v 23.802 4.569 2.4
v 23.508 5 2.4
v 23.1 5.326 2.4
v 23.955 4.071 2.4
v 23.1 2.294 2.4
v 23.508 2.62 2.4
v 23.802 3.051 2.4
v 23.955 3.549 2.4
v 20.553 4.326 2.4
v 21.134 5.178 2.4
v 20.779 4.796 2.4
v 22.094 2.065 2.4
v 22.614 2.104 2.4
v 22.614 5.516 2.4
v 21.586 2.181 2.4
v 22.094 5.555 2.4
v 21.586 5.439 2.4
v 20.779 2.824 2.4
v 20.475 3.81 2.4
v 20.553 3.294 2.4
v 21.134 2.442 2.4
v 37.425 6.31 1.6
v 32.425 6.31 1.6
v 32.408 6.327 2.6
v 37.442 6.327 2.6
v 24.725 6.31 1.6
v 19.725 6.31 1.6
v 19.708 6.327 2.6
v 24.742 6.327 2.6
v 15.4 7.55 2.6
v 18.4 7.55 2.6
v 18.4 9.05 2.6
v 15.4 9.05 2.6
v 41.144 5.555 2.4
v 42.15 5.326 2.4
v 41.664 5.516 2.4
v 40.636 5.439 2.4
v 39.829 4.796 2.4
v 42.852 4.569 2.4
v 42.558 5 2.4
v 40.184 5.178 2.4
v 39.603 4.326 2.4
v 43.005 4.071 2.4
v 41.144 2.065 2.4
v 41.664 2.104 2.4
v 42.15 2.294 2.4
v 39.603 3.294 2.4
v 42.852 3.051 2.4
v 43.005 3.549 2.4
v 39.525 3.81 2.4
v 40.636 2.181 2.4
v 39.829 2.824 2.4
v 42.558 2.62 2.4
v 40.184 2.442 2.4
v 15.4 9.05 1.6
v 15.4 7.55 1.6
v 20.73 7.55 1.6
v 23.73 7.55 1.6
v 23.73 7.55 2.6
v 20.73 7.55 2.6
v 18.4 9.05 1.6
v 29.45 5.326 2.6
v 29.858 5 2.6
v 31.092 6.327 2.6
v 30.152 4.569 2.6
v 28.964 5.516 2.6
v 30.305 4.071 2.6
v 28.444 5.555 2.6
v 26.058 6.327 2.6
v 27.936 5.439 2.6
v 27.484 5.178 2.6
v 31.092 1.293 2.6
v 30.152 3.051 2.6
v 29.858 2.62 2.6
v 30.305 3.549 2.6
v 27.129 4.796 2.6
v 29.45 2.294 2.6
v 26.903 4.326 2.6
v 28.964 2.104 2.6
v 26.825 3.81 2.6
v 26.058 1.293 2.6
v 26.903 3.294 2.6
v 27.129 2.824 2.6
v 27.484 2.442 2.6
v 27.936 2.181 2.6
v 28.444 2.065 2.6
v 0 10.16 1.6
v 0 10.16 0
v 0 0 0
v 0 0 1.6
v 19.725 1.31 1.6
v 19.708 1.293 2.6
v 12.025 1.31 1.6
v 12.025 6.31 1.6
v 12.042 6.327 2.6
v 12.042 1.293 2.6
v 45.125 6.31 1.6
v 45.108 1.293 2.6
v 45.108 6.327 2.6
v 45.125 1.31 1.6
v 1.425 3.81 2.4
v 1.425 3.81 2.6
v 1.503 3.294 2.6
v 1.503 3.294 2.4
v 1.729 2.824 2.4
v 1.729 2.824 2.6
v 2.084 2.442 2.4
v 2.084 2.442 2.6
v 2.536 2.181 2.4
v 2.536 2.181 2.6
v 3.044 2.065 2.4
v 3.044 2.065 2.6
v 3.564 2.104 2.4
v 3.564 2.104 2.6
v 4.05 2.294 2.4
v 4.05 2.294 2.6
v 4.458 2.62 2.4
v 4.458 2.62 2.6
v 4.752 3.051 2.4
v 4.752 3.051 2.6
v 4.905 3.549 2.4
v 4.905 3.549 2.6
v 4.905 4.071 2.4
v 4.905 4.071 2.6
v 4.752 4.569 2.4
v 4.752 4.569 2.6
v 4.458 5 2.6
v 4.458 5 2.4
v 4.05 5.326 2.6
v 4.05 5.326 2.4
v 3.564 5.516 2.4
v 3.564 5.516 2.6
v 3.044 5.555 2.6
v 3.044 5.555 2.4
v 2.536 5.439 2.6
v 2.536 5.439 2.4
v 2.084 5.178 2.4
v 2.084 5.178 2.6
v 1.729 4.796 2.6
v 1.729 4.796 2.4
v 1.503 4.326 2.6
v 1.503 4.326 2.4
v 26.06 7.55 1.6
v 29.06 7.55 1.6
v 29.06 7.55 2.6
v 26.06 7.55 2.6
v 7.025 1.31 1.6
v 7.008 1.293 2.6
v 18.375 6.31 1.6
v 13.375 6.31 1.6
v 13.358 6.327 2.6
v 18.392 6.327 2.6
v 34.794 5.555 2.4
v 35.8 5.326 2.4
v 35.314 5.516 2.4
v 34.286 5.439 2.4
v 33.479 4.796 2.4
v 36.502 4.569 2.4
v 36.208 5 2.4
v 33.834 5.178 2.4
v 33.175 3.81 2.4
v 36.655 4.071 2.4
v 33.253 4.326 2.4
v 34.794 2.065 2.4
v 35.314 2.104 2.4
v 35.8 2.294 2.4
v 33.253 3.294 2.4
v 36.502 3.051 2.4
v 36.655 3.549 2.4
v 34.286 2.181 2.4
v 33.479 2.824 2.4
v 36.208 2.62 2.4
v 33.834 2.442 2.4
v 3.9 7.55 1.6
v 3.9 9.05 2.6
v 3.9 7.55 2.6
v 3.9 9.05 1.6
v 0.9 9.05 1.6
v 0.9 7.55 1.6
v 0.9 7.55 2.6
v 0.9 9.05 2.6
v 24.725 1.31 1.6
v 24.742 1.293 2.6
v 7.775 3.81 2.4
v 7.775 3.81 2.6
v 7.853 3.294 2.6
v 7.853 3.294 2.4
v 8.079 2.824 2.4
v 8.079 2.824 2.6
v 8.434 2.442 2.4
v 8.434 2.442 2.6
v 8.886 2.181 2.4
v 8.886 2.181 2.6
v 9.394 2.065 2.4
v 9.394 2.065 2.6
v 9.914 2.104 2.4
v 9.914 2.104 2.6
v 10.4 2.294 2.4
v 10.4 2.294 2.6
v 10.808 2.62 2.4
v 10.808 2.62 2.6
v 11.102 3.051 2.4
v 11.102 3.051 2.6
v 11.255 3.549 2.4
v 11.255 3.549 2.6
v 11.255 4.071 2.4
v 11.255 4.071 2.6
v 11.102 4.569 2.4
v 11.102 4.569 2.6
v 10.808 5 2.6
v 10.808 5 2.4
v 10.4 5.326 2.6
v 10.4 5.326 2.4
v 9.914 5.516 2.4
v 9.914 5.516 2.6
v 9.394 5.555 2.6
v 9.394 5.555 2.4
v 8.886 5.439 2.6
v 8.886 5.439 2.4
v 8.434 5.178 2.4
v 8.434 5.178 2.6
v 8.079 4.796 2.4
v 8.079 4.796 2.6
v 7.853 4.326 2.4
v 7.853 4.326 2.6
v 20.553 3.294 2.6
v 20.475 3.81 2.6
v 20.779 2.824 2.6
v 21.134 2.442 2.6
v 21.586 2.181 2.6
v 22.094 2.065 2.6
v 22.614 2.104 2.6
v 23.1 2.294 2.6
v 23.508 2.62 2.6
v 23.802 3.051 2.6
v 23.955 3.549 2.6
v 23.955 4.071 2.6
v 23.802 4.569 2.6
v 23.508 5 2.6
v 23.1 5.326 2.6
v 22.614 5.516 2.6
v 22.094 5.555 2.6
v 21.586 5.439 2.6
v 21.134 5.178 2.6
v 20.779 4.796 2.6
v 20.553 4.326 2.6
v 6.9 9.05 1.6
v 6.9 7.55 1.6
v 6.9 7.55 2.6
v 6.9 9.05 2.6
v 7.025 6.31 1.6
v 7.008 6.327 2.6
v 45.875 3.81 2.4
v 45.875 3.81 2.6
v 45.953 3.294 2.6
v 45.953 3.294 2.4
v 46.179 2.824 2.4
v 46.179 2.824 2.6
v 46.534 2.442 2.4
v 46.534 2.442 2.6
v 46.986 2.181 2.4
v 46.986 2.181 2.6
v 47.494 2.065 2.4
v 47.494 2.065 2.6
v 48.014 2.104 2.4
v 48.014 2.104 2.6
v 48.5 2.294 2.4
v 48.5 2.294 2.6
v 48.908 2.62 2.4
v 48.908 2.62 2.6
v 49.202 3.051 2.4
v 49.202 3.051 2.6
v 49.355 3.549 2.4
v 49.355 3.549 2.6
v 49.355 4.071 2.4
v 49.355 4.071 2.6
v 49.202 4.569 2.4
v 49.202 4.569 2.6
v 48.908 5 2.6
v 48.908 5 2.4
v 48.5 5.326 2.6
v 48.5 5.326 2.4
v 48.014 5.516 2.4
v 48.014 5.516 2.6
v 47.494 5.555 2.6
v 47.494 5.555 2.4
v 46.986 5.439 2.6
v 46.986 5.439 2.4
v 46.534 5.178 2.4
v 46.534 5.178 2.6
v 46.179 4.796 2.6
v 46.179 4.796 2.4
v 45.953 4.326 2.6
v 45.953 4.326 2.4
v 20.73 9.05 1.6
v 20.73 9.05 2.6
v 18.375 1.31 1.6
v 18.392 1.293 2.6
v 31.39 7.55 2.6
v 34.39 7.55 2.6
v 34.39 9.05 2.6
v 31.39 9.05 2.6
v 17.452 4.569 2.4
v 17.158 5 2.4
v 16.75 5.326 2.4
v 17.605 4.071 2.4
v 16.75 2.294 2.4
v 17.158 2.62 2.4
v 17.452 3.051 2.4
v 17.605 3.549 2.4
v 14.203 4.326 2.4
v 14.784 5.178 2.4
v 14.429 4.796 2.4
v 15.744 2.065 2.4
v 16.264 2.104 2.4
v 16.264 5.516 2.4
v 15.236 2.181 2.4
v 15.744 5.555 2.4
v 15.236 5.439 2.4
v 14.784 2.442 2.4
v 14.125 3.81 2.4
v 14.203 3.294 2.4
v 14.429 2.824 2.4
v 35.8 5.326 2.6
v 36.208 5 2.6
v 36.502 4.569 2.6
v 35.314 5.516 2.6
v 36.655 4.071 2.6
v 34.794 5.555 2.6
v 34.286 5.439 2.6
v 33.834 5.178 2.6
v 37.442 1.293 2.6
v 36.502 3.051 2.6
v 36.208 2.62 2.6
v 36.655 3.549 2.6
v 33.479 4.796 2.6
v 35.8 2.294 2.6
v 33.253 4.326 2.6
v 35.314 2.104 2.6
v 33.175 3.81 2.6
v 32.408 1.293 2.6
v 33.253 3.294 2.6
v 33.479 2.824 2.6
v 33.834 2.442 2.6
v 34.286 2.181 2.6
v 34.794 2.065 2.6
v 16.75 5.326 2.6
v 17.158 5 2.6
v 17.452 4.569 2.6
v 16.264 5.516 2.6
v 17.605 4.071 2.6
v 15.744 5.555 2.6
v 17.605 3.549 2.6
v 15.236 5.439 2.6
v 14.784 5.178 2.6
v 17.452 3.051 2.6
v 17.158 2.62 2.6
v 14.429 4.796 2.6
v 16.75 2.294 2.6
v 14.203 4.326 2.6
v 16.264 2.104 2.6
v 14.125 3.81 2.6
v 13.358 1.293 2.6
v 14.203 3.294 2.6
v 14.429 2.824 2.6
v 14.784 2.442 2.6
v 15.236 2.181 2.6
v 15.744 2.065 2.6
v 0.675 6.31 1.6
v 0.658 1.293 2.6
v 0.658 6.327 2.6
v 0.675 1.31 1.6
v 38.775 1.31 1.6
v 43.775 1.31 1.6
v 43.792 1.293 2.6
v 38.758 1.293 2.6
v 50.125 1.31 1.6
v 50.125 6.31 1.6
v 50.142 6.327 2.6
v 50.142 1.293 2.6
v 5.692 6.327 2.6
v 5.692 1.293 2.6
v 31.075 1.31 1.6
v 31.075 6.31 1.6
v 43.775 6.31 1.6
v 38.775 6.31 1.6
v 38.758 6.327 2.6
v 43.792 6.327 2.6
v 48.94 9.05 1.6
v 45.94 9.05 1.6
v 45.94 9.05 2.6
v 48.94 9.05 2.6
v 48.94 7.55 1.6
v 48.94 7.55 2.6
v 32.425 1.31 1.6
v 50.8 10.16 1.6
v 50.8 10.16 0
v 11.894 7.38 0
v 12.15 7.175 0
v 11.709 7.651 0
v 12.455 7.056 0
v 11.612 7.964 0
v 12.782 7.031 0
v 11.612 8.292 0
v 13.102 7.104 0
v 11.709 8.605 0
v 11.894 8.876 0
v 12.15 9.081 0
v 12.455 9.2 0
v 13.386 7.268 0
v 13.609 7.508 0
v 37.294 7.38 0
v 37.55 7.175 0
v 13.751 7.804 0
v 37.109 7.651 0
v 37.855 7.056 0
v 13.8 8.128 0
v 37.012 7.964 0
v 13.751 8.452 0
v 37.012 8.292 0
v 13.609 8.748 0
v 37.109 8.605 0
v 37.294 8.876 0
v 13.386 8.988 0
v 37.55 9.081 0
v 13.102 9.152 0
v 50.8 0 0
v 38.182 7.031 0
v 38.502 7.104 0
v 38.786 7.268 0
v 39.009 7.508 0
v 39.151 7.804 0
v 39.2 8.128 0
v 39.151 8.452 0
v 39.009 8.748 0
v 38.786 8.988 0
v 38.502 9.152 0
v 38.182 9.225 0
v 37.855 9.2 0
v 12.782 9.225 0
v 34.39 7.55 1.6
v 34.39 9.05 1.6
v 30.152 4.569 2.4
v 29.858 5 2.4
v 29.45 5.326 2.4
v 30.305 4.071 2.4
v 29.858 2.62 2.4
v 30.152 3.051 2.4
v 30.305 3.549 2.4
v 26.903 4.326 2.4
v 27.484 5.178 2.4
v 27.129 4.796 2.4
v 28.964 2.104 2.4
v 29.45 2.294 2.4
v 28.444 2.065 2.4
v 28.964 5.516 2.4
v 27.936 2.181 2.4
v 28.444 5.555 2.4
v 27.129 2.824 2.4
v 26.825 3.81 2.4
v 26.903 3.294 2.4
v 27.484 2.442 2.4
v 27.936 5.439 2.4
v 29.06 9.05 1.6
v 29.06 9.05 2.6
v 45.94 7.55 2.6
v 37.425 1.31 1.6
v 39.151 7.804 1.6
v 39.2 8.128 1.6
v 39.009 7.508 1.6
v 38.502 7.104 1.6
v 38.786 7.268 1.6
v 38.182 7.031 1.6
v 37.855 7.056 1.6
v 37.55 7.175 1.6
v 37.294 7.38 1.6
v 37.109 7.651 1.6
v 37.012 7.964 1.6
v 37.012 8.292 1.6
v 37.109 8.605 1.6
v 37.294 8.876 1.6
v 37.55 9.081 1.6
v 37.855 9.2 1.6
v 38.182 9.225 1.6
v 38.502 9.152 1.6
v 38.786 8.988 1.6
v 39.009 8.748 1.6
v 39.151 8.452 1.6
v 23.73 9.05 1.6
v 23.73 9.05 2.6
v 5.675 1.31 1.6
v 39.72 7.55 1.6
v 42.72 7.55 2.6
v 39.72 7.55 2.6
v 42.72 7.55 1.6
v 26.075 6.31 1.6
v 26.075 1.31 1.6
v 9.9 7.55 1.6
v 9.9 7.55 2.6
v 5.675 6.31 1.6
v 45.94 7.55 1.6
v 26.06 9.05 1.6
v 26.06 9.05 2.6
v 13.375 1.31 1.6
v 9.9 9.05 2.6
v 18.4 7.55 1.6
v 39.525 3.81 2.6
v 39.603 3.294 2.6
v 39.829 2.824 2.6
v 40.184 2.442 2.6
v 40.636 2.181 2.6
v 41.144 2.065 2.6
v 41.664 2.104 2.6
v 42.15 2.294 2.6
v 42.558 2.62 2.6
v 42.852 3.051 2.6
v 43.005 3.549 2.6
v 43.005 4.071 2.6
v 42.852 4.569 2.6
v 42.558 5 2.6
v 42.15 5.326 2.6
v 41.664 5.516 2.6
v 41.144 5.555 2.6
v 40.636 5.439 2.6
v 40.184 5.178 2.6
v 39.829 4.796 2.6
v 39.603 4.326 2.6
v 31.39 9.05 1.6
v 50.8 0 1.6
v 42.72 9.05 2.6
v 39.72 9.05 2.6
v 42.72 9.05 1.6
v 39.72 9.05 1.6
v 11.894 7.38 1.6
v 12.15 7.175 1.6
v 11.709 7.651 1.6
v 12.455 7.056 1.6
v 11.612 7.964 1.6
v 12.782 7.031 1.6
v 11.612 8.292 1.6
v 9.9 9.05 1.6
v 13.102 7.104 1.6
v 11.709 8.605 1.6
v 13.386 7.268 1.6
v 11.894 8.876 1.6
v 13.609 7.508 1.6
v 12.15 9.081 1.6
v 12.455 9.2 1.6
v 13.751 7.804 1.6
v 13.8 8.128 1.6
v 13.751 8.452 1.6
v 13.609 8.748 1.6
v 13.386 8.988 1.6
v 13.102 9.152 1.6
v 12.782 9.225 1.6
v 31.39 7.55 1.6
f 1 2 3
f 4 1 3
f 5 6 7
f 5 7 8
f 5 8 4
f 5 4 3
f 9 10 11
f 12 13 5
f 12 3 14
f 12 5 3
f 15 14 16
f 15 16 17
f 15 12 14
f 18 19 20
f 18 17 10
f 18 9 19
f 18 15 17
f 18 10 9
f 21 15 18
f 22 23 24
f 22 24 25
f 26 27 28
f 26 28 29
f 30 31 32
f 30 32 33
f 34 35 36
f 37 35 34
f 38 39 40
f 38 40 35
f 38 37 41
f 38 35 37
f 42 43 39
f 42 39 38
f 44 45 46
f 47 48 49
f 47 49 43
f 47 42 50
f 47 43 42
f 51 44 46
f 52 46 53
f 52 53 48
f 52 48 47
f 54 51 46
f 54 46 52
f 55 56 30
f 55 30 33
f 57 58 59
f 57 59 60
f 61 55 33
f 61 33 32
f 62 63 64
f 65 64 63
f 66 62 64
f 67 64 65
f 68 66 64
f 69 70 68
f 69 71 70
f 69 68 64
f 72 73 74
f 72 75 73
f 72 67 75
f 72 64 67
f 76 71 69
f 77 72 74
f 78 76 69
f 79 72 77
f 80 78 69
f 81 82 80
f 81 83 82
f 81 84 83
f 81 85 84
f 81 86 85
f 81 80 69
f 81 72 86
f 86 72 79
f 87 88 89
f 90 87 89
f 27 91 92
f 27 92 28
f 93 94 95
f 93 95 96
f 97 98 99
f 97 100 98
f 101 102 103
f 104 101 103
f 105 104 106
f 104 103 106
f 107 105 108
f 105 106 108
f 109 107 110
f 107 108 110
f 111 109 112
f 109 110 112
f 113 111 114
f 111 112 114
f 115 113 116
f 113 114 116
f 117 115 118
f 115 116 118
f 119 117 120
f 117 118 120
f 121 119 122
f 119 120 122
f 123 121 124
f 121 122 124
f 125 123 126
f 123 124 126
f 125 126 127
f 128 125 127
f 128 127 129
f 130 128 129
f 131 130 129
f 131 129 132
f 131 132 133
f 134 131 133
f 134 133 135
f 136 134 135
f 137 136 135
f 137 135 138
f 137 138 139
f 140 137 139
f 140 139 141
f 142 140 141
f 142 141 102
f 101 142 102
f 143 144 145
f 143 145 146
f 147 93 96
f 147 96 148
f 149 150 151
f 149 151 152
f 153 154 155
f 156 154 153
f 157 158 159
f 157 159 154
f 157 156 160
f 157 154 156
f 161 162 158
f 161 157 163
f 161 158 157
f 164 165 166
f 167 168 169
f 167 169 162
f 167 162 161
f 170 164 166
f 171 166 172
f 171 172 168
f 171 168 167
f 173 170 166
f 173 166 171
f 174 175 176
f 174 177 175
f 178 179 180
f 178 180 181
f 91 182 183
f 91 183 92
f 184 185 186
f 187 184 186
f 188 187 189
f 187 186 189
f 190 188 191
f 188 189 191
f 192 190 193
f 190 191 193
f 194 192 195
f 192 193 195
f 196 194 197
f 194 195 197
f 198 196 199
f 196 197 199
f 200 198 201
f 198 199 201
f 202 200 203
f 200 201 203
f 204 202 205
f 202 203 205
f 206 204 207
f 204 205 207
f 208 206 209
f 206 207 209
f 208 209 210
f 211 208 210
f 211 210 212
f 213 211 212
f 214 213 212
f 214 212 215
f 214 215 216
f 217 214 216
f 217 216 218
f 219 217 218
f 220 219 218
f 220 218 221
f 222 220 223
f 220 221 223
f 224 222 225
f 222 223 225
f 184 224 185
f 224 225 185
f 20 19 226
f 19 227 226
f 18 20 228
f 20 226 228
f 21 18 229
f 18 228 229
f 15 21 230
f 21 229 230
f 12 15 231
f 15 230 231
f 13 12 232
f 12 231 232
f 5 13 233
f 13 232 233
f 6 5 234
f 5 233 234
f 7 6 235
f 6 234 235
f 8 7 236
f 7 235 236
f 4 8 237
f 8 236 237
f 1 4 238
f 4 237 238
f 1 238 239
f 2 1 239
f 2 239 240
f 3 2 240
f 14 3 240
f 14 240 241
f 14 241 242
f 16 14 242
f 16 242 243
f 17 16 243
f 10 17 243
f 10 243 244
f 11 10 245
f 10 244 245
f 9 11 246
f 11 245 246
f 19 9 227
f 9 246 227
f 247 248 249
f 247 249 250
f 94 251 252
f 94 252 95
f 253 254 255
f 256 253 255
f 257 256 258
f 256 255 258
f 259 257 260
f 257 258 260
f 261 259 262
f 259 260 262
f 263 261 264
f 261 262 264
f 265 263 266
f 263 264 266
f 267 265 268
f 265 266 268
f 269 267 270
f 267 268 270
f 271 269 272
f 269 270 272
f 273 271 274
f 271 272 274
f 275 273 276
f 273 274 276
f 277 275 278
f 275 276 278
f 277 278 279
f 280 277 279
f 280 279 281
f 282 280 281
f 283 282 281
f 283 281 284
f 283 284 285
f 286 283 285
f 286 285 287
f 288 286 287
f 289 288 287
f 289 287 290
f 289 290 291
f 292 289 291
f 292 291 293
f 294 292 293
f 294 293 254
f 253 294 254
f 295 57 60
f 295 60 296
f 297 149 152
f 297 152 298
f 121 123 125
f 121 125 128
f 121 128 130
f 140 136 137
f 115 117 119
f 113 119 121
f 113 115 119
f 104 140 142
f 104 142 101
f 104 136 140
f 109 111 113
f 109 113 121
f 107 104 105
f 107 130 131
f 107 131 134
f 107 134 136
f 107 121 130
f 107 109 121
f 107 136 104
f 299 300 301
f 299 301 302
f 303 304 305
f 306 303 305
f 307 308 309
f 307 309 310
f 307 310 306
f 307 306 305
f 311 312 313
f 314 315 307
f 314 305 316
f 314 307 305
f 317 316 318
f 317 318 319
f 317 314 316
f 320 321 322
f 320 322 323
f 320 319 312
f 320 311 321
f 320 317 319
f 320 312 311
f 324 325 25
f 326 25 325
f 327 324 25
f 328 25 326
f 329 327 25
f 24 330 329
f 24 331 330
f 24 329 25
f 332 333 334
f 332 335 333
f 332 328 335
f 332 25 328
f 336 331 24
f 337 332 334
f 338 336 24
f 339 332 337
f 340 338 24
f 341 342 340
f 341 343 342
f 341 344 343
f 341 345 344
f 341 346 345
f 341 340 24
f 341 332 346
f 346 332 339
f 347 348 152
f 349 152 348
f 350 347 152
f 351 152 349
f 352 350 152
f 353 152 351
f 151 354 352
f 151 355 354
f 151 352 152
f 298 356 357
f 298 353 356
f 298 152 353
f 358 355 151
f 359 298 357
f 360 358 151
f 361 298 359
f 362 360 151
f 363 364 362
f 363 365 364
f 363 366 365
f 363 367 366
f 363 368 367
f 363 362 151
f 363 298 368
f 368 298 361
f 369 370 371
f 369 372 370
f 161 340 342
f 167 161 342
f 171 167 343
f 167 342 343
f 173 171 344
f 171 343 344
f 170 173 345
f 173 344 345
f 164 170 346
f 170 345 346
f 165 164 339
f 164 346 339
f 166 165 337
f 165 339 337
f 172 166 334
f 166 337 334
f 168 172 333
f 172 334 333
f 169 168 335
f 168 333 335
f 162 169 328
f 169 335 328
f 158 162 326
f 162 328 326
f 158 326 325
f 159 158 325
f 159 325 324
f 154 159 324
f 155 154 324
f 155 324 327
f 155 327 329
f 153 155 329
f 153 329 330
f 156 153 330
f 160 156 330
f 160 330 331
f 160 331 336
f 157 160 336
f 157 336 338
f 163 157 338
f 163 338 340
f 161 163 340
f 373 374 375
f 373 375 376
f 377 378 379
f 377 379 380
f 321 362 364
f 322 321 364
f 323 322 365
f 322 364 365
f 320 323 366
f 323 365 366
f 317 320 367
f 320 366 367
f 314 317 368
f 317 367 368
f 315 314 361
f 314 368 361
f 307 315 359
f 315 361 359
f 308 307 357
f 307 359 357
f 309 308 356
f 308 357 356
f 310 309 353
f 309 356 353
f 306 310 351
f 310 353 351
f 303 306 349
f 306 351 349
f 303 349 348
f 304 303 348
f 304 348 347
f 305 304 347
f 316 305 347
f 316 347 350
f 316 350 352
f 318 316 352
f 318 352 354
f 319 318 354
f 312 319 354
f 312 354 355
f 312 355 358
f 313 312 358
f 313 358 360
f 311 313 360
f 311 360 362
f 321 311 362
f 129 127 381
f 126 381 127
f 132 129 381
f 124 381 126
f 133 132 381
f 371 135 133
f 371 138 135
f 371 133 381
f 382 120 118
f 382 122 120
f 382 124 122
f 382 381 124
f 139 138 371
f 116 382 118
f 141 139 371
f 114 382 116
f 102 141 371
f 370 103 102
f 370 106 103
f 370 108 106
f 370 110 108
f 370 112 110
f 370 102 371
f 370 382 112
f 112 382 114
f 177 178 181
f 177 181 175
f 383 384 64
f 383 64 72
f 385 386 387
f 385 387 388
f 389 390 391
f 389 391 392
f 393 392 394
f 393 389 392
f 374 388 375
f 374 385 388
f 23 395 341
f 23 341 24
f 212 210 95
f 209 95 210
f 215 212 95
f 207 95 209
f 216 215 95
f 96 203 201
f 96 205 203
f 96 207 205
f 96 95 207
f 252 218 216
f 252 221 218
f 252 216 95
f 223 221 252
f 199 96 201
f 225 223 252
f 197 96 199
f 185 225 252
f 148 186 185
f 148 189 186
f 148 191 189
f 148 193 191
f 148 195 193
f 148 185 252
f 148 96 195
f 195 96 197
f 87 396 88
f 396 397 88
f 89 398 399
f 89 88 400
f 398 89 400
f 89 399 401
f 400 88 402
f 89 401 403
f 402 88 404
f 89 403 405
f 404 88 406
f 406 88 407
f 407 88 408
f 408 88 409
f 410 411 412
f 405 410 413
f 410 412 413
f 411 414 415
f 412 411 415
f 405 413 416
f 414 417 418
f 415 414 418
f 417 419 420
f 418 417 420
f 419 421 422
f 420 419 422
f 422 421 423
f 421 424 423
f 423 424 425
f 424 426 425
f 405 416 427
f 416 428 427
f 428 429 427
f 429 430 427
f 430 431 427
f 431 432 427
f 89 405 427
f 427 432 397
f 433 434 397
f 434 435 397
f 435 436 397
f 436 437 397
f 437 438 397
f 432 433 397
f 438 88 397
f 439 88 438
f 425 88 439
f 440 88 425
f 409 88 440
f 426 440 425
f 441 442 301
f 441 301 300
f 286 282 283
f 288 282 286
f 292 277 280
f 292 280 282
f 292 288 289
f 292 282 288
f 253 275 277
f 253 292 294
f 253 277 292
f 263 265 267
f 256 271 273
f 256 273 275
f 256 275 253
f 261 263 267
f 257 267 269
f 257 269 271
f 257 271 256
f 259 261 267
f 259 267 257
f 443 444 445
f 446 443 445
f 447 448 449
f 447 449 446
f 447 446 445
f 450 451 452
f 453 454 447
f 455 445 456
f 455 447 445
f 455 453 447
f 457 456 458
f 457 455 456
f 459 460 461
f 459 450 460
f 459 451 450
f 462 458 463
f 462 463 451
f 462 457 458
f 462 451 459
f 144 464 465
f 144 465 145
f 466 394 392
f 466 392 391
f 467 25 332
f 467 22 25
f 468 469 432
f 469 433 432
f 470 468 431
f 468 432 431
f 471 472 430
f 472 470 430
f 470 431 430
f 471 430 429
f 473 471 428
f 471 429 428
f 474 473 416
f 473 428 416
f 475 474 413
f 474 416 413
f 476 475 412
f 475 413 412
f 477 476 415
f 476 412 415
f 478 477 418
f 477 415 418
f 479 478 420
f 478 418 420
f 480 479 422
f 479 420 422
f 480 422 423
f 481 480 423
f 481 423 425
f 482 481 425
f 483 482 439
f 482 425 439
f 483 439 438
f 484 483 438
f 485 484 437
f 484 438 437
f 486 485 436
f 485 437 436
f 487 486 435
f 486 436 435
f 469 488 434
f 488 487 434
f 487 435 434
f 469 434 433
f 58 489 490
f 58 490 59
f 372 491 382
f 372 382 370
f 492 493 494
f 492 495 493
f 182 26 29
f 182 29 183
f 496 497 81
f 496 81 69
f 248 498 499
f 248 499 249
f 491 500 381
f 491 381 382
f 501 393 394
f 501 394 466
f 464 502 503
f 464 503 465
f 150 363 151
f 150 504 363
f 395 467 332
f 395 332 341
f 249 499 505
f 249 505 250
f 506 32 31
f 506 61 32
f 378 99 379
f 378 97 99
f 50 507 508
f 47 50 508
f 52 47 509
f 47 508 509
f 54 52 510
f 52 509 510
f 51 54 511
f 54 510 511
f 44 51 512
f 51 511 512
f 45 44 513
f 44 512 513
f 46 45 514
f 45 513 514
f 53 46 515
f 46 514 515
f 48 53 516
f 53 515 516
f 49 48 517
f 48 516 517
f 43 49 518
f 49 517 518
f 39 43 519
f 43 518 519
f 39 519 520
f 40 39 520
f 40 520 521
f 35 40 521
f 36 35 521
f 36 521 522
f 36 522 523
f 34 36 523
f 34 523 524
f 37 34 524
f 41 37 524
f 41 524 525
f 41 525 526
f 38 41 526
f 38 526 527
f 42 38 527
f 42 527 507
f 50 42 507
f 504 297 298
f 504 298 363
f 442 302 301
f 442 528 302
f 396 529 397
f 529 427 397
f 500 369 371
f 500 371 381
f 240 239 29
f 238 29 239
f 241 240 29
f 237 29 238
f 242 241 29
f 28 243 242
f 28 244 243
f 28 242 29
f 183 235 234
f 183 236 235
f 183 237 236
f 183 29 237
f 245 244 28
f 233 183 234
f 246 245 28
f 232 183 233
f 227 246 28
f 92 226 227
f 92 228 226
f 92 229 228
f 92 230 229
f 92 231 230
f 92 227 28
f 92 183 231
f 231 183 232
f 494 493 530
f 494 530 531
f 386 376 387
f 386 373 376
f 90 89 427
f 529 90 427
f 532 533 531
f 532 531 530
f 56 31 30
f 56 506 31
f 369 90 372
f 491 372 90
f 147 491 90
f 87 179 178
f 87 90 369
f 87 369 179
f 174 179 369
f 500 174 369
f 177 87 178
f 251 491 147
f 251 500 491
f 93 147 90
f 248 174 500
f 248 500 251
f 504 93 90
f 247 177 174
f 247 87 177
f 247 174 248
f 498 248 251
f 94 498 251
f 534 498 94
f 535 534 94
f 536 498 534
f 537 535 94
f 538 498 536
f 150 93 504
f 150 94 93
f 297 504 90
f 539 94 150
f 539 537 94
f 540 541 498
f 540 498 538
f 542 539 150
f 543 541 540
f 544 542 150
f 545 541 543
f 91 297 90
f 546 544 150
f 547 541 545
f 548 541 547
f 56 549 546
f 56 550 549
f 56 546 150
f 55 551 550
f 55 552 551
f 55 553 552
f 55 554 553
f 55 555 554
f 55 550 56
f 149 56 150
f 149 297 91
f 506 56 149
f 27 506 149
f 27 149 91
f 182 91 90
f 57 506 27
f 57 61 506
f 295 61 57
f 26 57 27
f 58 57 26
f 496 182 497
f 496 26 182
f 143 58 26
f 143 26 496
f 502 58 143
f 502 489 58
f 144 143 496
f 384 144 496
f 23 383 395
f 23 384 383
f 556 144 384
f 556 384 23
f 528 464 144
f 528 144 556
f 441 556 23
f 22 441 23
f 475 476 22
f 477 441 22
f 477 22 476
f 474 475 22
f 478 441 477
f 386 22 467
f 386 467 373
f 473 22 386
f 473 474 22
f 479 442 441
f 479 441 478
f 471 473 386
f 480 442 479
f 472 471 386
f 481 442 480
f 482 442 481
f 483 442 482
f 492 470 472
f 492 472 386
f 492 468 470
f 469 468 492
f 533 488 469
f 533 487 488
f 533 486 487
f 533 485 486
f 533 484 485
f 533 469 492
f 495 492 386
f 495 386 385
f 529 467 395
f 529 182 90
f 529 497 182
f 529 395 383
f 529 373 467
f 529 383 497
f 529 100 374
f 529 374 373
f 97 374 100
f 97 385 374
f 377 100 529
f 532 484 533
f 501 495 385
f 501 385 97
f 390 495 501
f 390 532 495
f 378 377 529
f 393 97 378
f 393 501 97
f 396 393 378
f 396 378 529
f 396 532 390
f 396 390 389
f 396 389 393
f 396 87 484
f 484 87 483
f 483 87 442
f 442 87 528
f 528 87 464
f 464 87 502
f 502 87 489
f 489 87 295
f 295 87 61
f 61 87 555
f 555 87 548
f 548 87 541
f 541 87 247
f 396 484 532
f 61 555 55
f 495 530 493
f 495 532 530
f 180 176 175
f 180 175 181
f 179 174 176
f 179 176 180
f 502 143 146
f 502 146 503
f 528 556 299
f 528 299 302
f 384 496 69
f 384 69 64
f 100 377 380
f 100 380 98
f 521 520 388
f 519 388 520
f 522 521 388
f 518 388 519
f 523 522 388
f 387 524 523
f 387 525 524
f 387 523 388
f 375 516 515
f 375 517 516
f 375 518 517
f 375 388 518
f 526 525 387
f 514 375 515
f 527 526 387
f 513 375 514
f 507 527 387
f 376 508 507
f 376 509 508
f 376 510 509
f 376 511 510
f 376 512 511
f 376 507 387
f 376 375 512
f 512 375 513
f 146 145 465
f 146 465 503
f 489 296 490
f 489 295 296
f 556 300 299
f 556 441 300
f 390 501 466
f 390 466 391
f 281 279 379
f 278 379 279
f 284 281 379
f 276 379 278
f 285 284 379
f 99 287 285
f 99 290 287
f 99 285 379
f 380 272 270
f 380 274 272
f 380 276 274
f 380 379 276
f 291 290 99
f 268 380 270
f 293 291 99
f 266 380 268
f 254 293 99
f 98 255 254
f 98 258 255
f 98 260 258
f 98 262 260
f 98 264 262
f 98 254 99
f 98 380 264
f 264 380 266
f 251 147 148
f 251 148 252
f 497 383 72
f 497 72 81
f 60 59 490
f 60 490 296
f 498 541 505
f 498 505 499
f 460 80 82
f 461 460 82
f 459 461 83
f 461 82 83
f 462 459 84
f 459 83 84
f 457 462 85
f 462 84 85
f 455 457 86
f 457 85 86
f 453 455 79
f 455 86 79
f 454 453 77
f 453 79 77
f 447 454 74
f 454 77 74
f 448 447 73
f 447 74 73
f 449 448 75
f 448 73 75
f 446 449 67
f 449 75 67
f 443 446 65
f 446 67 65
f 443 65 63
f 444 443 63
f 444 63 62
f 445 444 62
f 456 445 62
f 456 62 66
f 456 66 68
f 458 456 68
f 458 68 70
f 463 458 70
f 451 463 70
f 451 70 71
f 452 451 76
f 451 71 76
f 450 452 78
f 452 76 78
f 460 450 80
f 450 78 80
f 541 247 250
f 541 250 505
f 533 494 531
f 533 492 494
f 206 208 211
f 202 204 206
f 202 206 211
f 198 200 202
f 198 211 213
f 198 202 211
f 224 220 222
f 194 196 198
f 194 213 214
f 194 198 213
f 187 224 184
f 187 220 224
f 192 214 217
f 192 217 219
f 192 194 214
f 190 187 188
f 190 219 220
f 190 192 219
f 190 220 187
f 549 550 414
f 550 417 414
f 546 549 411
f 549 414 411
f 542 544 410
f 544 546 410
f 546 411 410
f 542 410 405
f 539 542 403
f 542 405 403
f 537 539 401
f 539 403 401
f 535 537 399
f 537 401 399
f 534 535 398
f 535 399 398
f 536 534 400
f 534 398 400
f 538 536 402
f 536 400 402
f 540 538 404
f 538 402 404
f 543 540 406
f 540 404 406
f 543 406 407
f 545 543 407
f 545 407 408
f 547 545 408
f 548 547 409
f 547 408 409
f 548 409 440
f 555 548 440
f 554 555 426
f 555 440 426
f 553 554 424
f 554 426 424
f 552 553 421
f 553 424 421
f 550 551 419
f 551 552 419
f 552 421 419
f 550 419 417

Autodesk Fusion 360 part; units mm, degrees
sketch "Sketch1" plane through (0, 0, 0) normal (0, 0, 1) x (1, 0, 0)
  line L0 (0, 0) -> (50.8, 0)
  line L1 (50.8, 0) -> (50.8, 10.16)
  line L2 (50.8, 10.16) -> (0, 10.16)
  line L3 (0, 10.16) -> (0, 0)
  line L4 (25.4, 10.16) -> (25.4, 0) construction
  circle A0 centre (12.7, 8.128) radius 1.1
  circle A1 centre (38.1, 8.128) radius 1.1
  dimension "d1" = 50.8
  dimension "d2" = 10.16
  dimension "d3" = 2.2
  dimension "d4" = 2.2
  dimension "d5" = 12.7
  dimension "d6" = 38.1
  dimension "d7" = 8.128
  dimension "d8" = 8.128
extrude "Extrude1" add sketch "Sketch1" along normal blind 1.6
sketch "Sketch2" plane through (0, 0, 1.6) normal (0, 0, 1) x (-1, 0, 0)
  circle A0 centre (-12.7, -8.128) radius 1.1
  circle A1 centre (-38.1, -8.128) radius 1.1
  line L0 (0, -10.16) -> (0, 0)
  line L1 (0, 0) -> (-50.8, 0)
  line L2 (-50.8, 0) -> (-50.8, -10.16)
  line L3 (-50.8, -10.16) -> (0, -10.16)
  line L4 (-5.675, -1.31) -> (-0.675, -1.31)
  line L5 (-0.675, -1.31) -> (-0.675, -6.31)
  line L6 (-0.675, -6.31) -> (-5.675, -6.31)
  line L7 (-5.675, -6.31) -> (-5.675, -1.31)
  line L8 (-5.675, -1.31) -> (-0.675, -6.31) construction
  line L9 (-0.675, -1.31) -> (-5.675, -6.31) construction
  circle A2 centre (-3.175, -3.81) radius 1.75
  line L10 (-7.025, -1.31) -> (-7.025, -6.31)
  line L11 (-7.025, -6.31) -> (-12.025, -6.31)
  line L12 (-12.025, -1.31) -> (-7.025, -1.31)
  line L13 (-12.025, -6.31) -> (-12.025, -1.31)
  circle A3 centre (-9.525, -3.81) radius 1.75
  line L14 (-13.375, -1.31) -> (-13.375, -6.31)
  line L15 (-13.375, -6.31) -> (-18.375, -6.31)
  line L16 (-18.375, -1.31) -> (-13.375, -1.31)
  line L17 (-18.375, -6.31) -> (-18.375, -1.31)
  circle A4 centre (-15.875, -3.81) radius 1.75
  line L18 (-19.725, -1.31) -> (-19.725, -6.31)
  line L19 (-19.725, -6.31) -> (-24.725, -6.31)
  line L20 (-24.725, -1.31) -> (-19.725, -1.31)
  line L21 (-24.725, -6.31) -> (-24.725, -1.31)
  circle A5 centre (-22.225, -3.81) radius 1.75
  line L22 (-26.075, -1.31) -> (-26.075, -6.31)
  line L23 (-26.075, -6.31) -> (-31.075, -6.31)
  line L24 (-31.075, -1.31) -> (-26.075, -1.31)
  line L25 (-31.075, -6.31) -> (-31.075, -1.31)
  circle A6 centre (-28.575, -3.81) radius 1.75
  line L26 (-32.425, -1.31) -> (-32.425, -6.31)
  line L27 (-32.425, -6.31) -> (-37.425, -6.31)
  line L28 (-37.425, -1.31) -> (-32.425, -1.31)
  line L29 (-37.425, -6.31) -> (-37.425, -1.31)
  circle A7 centre (-34.925, -3.81) radius 1.75
  line L30 (-38.775, -1.31) -> (-38.775, -6.31)
  line L31 (-38.775, -6.31) -> (-43.775, -6.31)
  line L32 (-43.775, -1.31) -> (-38.775, -1.31)
  line L33 (-43.775, -6.31) -> (-43.775, -1.31)
  circle A8 centre (-41.275, -3.81) radius 1.75
  line L34 (-45.125, -1.31) -> (-45.125, -6.31)
  line L35 (-45.125, -6.31) -> (-50.125, -6.31)
  line L36 (-50.125, -1.31) -> (-45.125, -1.31)
  line L37 (-50.125, -6.31) -> (-50.125, -1.31)
  circle A9 centre (-47.625, -3.81) radius 1.75
  point P0 (-3.175, -3.81)
  dimension "d13" = 5
  dimension "d14" = 5
  dimension "d15" = 3.175
  dimension "d16" = 3.81
  dimension "d17" = 3.5
  dimension "d20" = -6.35
  dimension "d21" = 0
extrude "Extrude2" add sketch "Sketch2" along normal blind 1 draft 1 contours L4 L5 L6 L7 | A2 | L10 L11 L12 L13 | A3 | L14 L15 L16 L17 | A4 | L18 L19 L20 L21 | A5 | L22 L23 L24 L25 | A6 | L26 L27 L28 L29 | A7 | L30 L31 L32 L33 | A8 | L34 L35 L36 L37 | A9
extrude "Extrude3" cut sketch "Sketch2" against normal blind 0.2 from surface at 1 contours A2 | A3 | A4 | A5 | A6 | A7 | A8 | A9
sketch "Sketch3" plane through (0, 0, 1.6) normal (0, 0, 1) x (-1, 0, 0)
  line L0 (-50.125, -6.31) -> (-50.125, -1.31)
  line L1 (-50.125, -1.31) -> (-45.125, -1.31)
  line L2 (-45.125, -1.31) -> (-45.125, -6.31)
  line L3 (-45.125, -6.31) -> (-50.125, -6.31)
  line L4 (-24.725, -6.31) -> (-24.725, -1.31)
  line L5 (-24.725, -1.31) -> (-19.725, -1.31)
  line L6 (-19.725, -1.31) -> (-19.725, -6.31)
  line L7 (-19.725, -6.31) -> (-24.725, -6.31)
  line L8 (-5.675, -6.31) -> (-5.675, -1.31)
  line L9 (-5.675, -1.31) -> (-0.675, -1.31)
  line L10 (-0.675, -1.31) -> (-0.675, -6.31)
  line L11 (-0.675, -6.31) -> (-5.675, -6.31)
  line L12 (-31.075, -6.31) -> (-31.075, -1.31)
  line L13 (-31.075, -1.31) -> (-26.075, -1.31)
  line L14 (-26.075, -1.31) -> (-26.075, -6.31)
  line L15 (-26.075, -6.31) -> (-31.075, -6.31)
  line L16 (-43.775, -6.31) -> (-43.775, -1.31)
  line L17 (-43.775, -1.31) -> (-38.775, -1.31)
  line L18 (-38.775, -1.31) -> (-38.775, -6.31)
  line L19 (-38.775, -6.31) -> (-43.775, -6.31)
  line L20 (-18.375, -6.31) -> (-18.375, -1.31)
  line L21 (-18.375, -1.31) -> (-13.375, -1.31)
  line L22 (-13.375, -1.31) -> (-13.375, -6.31)
  line L23 (-13.375, -6.31) -> (-18.375, -6.31)
  line L24 (-12.025, -6.31) -> (-12.025, -1.31)
  line L25 (-12.025, -1.31) -> (-7.025, -1.31)
  line L26 (-7.025, -1.31) -> (-7.025, -6.31)
  line L27 (-7.025, -6.31) -> (-12.025, -6.31)
  line L28 (-37.425, -6.31) -> (-37.425, -1.31)
  line L29 (-37.425, -1.31) -> (-32.425, -1.31)
  line L30 (-32.425, -1.31) -> (-32.425, -6.31)
  line L31 (-32.425, -6.31) -> (-37.425, -6.31)
  circle A0 centre (-12.7, -8.128) radius 1.1
  circle A1 centre (-38.1, -8.128) radius 1.1
  line L32 (0, -10.16) -> (0, 0)
  line L33 (0, 0) -> (-50.8, 0)
  line L34 (-50.8, 0) -> (-50.8, -10.16)
  line L35 (-50.8, -10.16) -> (0, -10.16)
  line L36 (-0.9, -9.05) -> (-3.9, -9.05)
  line L37 (-3.9, -9.05) -> (-3.9, -7.55)
  line L38 (-3.9, -7.55) -> (-0.9, -7.55)
  line L39 (-0.9, -7.55) -> (-0.9, -9.05)
  line L40 (-2.4, -9.05) -> (-2.4, -7.55) construction
  line L41 (-3.9, -8.3) -> (-0.9, -8.3) construction
  line L42 (-6.9, -7.55) -> (-6.9, -9.05)
  line L43 (-6.9, -9.05) -> (-9.9, -9.05)
  line L44 (-9.9, -7.55) -> (-6.9, -7.55)
  line L45 (-9.9, -9.05) -> (-9.9, -7.55)
  line L46 (-15.4, -9.05) -> (-18.4, -9.05)
  line L47 (-18.4, -9.05) -> (-18.4, -7.55)
  line L48 (-18.4, -7.55) -> (-15.4, -7.55)
  line L49 (-15.4, -7.55) -> (-15.4, -9.05)
  line L50 (-16.9, -9.05) -> (-16.9, -7.55) construction
  line L51 (-18.4, -8.3) -> (-15.4, -8.3) construction
  line L52 (-23.73, -7.55) -> (-20.73, -7.55)
  line L53 (-20.73, -7.55) -> (-20.73, -9.05)
  line L54 (-20.73, -9.05) -> (-23.73, -9.05)
  line L55 (-23.73, -9.05) -> (-23.73, -7.55)
  line L56 (-29.06, -7.55) -> (-26.06, -7.55)
  line L57 (-26.06, -7.55) -> (-26.06, -9.05)
  line L58 (-26.06, -9.05) -> (-29.06, -9.05)
  line L59 (-29.06, -9.05) -> (-29.06, -7.55)
  line L60 (-34.39, -7.55) -> (-31.39, -7.55)
  line L61 (-31.39, -7.55) -> (-31.39, -9.05)
  line L62 (-31.39, -9.05) -> (-34.39, -9.05)
  line L63 (-34.39, -9.05) -> (-34.39, -7.55)
  line L64 (-39.72, -9.05) -> (-42.72, -9.05)
  line L65 (-42.72, -9.05) -> (-42.72, -7.55)
  line L66 (-42.72, -7.55) -> (-39.72, -7.55)
  line L67 (-39.72, -7.55) -> (-39.72, -9.05)
  line L68 (-41.22, -9.05) -> (-41.22, -7.55) construction
  line L69 (-39.72, -8.3) -> (-42.72, -8.3) construction
  line L70 (-32.89, -9.05) -> (-32.89, -7.55) construction
  line L71 (-45.94, -7.55) -> (-45.94, -9.05)
  line L72 (-45.94, -9.05) -> (-48.94, -9.05)
  line L73 (-48.94, -7.55) -> (-45.94, -7.55)
  line L74 (-48.94, -9.05) -> (-48.94, -7.55)
  dimension "d27" = 3
  dimension "d28" = 1.5
  dimension "d29" = 2.4
  dimension "d30" = 8.3
  dimension "d33" = -6
  dimension "d34" = 0
  dimension "d35" = 3
  dimension "d36" = 1.5
  dimension "d37" = 14.5
  dimension "d40" = -5.33
  dimension "d41" = 0
  dimension "d42" = 3
  dimension "d43" = 1.5
  dimension "d44" = 8.33
  dimension "d47" = -6.22
  dimension "d48" = 0
extrude "Extrude4" add sketch "Sketch3" along normal blind 1 contours L36 L37 L38 L39 | L42 L43 L44 L45 | L46 L47 L48 L49 | L52 L53 L54 L55 | L56 L57 L58 L59 | L60 L61 L62 L63 | L64 L65 L66 L67 | L71 L72 L73 L74
